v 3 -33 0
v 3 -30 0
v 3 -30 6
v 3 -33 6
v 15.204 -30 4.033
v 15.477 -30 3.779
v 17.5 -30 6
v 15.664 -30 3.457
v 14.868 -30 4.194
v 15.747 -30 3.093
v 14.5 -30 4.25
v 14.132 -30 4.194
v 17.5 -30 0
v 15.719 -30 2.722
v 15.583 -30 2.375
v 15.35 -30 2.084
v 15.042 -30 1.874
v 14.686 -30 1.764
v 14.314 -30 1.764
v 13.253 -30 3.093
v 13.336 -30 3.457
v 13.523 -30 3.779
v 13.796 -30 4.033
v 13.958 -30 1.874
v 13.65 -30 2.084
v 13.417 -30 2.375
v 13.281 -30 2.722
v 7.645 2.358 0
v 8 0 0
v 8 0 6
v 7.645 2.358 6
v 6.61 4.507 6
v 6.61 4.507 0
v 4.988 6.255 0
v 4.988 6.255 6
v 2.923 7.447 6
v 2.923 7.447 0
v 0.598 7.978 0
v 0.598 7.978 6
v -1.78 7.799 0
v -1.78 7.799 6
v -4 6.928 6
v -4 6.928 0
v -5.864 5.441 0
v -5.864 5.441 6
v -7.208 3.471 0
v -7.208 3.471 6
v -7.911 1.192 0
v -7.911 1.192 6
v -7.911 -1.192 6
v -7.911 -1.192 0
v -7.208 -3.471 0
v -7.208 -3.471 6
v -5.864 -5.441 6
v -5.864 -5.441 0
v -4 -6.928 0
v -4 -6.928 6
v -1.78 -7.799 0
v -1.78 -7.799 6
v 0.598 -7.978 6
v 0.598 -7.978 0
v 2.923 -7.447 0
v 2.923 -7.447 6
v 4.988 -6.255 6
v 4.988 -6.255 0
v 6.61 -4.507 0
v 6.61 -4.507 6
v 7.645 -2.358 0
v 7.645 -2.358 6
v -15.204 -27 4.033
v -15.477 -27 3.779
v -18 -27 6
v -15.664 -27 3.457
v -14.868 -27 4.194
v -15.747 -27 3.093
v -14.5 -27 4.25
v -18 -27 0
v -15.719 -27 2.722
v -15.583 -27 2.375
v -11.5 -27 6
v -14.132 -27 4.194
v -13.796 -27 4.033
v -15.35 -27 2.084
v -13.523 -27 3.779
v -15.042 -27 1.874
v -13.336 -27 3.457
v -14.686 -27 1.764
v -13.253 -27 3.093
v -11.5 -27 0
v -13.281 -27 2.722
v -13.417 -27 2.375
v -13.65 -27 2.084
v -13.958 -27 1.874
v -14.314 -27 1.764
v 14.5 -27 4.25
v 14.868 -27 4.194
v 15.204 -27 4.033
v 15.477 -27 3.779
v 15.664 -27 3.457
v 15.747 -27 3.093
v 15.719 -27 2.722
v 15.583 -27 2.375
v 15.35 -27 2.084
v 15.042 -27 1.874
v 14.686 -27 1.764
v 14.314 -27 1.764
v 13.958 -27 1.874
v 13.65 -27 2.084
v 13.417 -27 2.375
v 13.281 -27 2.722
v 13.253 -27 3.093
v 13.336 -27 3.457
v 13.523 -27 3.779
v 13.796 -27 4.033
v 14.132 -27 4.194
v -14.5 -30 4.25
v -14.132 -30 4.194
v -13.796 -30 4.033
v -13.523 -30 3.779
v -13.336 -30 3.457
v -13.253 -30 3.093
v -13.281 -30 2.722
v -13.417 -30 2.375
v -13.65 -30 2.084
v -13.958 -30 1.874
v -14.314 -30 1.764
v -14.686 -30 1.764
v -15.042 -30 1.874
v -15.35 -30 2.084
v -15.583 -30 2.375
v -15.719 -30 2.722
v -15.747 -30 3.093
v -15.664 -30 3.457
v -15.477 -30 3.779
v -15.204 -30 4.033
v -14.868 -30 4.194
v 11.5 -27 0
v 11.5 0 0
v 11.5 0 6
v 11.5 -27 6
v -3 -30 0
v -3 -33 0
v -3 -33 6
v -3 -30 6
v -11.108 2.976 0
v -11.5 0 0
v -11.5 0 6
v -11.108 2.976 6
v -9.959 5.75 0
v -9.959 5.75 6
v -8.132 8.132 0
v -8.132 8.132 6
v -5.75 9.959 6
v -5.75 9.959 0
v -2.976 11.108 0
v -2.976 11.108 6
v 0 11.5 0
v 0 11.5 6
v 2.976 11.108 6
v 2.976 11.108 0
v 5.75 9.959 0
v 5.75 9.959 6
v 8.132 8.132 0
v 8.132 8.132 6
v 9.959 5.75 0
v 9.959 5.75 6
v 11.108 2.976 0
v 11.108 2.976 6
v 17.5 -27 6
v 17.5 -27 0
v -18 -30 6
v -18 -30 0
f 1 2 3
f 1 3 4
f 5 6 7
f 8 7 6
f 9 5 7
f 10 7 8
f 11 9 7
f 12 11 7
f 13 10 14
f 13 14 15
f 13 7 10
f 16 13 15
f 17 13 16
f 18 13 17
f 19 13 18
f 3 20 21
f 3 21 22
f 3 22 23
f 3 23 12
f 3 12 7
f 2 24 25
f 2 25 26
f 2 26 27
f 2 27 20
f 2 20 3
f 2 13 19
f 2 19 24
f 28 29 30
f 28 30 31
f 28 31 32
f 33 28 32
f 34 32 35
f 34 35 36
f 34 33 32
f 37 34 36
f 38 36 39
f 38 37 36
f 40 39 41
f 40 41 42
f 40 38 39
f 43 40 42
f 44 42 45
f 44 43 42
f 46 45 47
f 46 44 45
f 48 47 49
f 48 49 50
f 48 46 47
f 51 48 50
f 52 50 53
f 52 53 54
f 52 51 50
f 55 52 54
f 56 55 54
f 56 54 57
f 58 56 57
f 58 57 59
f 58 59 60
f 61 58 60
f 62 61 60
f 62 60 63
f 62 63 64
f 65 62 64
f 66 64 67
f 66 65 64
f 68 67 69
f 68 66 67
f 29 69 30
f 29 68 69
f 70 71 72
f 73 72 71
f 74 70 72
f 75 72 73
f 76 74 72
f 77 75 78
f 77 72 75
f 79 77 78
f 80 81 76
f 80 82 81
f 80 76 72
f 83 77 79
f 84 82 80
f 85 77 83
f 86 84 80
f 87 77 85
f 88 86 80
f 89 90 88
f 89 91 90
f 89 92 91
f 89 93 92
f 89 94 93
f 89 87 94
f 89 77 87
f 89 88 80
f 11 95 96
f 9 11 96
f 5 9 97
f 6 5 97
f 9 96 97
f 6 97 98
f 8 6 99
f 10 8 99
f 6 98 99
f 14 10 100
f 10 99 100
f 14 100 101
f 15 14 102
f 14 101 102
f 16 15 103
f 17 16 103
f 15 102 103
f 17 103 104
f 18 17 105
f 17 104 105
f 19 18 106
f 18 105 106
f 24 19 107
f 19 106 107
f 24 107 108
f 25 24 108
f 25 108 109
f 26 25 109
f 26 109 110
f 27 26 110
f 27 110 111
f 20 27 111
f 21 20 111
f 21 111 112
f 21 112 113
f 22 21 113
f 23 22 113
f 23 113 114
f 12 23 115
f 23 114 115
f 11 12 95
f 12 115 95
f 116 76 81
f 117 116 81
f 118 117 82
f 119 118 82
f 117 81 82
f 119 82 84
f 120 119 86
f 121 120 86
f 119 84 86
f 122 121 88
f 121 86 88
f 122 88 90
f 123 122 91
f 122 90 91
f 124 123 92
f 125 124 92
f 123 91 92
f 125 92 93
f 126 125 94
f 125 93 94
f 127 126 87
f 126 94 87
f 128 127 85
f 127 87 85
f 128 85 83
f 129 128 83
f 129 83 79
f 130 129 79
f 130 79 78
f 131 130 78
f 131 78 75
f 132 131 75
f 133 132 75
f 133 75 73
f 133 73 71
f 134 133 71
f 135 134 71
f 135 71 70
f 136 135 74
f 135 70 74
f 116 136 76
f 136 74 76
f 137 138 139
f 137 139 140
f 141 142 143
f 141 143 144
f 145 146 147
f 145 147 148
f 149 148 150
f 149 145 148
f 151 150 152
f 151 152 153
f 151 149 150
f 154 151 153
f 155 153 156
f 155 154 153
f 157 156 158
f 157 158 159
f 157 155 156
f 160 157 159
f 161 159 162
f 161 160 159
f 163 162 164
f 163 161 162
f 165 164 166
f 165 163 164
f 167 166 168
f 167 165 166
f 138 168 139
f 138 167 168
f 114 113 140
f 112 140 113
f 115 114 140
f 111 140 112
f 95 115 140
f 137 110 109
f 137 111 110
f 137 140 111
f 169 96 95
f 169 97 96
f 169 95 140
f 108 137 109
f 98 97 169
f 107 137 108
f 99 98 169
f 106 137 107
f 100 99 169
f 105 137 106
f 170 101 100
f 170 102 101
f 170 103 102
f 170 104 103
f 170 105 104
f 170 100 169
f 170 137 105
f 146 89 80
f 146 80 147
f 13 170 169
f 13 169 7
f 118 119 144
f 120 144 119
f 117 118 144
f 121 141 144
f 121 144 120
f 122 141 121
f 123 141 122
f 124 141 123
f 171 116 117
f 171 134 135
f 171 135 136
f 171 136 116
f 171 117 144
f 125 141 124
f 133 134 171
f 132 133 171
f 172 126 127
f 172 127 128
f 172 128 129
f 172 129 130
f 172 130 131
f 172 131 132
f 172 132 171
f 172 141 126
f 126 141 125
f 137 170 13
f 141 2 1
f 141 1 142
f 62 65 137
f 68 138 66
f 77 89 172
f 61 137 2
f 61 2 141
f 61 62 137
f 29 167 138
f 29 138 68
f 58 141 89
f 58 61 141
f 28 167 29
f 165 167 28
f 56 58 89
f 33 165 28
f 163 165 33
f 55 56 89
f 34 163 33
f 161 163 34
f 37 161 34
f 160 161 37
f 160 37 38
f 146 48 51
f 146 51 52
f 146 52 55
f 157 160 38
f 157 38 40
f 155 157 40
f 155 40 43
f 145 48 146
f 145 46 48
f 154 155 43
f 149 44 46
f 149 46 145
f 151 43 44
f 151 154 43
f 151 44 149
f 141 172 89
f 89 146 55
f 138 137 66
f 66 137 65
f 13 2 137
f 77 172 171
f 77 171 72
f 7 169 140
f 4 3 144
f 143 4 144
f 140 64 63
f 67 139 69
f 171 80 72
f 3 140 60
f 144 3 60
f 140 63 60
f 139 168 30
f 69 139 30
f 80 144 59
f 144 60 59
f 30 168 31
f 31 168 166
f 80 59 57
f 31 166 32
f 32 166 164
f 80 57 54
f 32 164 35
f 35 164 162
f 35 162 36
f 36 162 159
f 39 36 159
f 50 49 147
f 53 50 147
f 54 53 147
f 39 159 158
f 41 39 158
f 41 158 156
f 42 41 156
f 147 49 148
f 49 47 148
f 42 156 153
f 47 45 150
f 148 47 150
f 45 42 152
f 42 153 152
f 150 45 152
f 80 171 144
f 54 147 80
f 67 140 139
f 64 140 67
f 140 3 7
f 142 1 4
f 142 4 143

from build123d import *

# Parameters (mm, degrees)
SKETCH_1_R          = 8
EXTRUDE_1_DEPTH     = 6
SKETCH_2_R          = 1.25
CUT_EXTRUDE_1_DEPTH = 3


with BuildPart() as part:
    # 草图1 → 凸台-拉伸1 (new body)
    with BuildSketch(Plane.XY):
        with BuildLine():
            Line((-3, -30), (-18, -30))
            Line((-18, -30), (-18, -27))
            Line((-18, -27), (-11.5, -27))
            Line((-11.5, -27), (-11.5, 0))
            ThreePointArc((-11.5, 0), (0, 11.5), (11.5, 0))
            Line((11.5, 0), (11.5, -27))
            Line((11.5, -27), (17.5, -27))
            Line((17.5, -27), (17.5, -30))
            Line((17.5, -30), (3, -30))
            Line((3, -30), (3, -33))
            Line((3, -33), (0, -33))
            Line((0, -33), (-3, -33))
            Line((-3, -33), (-3, -30))
        make_face()
        Circle(SKETCH_1_R, mode=Mode.SUBTRACT)
    extrude(amount=EXTRUDE_1_DEPTH)

    # 草图2 → 切除-拉伸1 (cut)
    with BuildSketch(Plane(origin=(0, -27, 0), x_dir=(1, 0, 0), z_dir=(0, 1, 0))):
        with Locations(Location((-14.5, -3, 0), (0, 0, 270))):
            Circle(SKETCH_2_R)
        with Locations(Location((14.5, -3, 0), (0, 0, 270))):
            Circle(SKETCH_2_R)
    extrude(amount=-CUT_EXTRUDE_1_DEPTH, mode=Mode.SUBTRACT)


solid = part.part
